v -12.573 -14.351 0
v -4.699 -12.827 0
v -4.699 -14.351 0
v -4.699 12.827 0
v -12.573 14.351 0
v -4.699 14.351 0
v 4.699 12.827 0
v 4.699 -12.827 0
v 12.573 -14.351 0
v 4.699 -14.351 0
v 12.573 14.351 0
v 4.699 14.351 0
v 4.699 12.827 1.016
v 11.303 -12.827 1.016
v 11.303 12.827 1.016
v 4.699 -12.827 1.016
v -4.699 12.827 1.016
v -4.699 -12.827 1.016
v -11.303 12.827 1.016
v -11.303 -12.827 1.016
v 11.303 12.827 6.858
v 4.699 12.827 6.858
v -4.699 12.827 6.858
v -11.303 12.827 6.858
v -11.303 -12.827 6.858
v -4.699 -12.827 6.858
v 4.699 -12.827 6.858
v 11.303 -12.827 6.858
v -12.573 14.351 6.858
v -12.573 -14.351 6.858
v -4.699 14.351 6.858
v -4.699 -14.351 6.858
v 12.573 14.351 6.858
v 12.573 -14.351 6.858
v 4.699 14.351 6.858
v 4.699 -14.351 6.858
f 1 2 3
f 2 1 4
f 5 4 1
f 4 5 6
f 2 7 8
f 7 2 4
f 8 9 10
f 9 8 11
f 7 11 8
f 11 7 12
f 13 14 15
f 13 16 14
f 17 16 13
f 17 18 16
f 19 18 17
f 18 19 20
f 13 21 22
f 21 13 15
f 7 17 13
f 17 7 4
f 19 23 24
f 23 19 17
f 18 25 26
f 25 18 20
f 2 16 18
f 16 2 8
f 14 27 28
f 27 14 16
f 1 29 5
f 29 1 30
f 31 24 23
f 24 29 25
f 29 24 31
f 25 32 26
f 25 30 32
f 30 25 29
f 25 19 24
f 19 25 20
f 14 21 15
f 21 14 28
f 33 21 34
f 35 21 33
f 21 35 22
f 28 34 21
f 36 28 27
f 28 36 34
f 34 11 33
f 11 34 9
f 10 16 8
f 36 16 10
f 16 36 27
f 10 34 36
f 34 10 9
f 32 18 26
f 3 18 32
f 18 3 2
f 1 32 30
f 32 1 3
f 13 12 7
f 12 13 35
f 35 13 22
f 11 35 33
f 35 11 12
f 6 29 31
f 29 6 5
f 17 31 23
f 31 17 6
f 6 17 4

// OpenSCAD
ViewScale = [0.0254, 0.0254, 0.0254];

module lid1()
{
    linear_extrude(40) square([880, 1010], center=true);

    // long sides
    translate([-460, 0, 0]) linear_extrude(360) square([50, 1100], center=true);
    translate([460, 0, 0]) linear_extrude(360) square([50, 1100], center=true);

    translate([330, -535, 0]) linear_extrude(360) square([310, 60], center=true);
    translate([-330, -535, 0]) linear_extrude(360) square([310, 60], center=true);

    translate([330, 535, 0]) linear_extrude(360) square([310, 60], center=true);
    translate([-330, 535, 0]) linear_extrude(360) square([310, 60], center=true);

//    translate([0, 525, 0]) linear_extrude(360) square([960, 60], center=true);

}

module lid2()
{
    linear_extrude(40) square([870, 1010], center=true);

    // long sides
    translate([-460, 0, 0]) linear_extrude(300) square([50, 1100], center=true);
    translate([460, 0, 0]) linear_extrude(300) square([50, 1100], center=true);

    translate([330, -535, 0]) linear_extrude(300) square([310, 60], center=true);
    translate([-330, -535, 0]) linear_extrude(300) square([310, 60], center=true);

    translate([330, 535, 0]) linear_extrude(300) square([310, 60], center=true);
    translate([-330, 535, 0]) linear_extrude(300) square([310, 60], center=true);
}

module lid3()
{
    linear_extrude(40) square([900, 1010], center=true);

    // long sides
    translate([-470, 0, 0]) linear_extrude(270) square([50, 1100], center=true);
    translate([470, 0, 0]) linear_extrude(270) square([50, 1100], center=true);

    translate([340, -535, 0]) linear_extrude(270) square([310, 60], center=true);
    translate([-340, -535, 0]) linear_extrude(270) square([310, 60], center=true);

    translate([340, 535, 0]) linear_extrude(270) square([310, 60], center=true);
    translate([-340, 535, 0]) linear_extrude(270) square([310, 60], center=true);
}

scale(ViewScale)
{
    lid3();
//    translate([0, 1000, 0]) lid2();
//    translate([1000, 0, 0]) lid3();
}
